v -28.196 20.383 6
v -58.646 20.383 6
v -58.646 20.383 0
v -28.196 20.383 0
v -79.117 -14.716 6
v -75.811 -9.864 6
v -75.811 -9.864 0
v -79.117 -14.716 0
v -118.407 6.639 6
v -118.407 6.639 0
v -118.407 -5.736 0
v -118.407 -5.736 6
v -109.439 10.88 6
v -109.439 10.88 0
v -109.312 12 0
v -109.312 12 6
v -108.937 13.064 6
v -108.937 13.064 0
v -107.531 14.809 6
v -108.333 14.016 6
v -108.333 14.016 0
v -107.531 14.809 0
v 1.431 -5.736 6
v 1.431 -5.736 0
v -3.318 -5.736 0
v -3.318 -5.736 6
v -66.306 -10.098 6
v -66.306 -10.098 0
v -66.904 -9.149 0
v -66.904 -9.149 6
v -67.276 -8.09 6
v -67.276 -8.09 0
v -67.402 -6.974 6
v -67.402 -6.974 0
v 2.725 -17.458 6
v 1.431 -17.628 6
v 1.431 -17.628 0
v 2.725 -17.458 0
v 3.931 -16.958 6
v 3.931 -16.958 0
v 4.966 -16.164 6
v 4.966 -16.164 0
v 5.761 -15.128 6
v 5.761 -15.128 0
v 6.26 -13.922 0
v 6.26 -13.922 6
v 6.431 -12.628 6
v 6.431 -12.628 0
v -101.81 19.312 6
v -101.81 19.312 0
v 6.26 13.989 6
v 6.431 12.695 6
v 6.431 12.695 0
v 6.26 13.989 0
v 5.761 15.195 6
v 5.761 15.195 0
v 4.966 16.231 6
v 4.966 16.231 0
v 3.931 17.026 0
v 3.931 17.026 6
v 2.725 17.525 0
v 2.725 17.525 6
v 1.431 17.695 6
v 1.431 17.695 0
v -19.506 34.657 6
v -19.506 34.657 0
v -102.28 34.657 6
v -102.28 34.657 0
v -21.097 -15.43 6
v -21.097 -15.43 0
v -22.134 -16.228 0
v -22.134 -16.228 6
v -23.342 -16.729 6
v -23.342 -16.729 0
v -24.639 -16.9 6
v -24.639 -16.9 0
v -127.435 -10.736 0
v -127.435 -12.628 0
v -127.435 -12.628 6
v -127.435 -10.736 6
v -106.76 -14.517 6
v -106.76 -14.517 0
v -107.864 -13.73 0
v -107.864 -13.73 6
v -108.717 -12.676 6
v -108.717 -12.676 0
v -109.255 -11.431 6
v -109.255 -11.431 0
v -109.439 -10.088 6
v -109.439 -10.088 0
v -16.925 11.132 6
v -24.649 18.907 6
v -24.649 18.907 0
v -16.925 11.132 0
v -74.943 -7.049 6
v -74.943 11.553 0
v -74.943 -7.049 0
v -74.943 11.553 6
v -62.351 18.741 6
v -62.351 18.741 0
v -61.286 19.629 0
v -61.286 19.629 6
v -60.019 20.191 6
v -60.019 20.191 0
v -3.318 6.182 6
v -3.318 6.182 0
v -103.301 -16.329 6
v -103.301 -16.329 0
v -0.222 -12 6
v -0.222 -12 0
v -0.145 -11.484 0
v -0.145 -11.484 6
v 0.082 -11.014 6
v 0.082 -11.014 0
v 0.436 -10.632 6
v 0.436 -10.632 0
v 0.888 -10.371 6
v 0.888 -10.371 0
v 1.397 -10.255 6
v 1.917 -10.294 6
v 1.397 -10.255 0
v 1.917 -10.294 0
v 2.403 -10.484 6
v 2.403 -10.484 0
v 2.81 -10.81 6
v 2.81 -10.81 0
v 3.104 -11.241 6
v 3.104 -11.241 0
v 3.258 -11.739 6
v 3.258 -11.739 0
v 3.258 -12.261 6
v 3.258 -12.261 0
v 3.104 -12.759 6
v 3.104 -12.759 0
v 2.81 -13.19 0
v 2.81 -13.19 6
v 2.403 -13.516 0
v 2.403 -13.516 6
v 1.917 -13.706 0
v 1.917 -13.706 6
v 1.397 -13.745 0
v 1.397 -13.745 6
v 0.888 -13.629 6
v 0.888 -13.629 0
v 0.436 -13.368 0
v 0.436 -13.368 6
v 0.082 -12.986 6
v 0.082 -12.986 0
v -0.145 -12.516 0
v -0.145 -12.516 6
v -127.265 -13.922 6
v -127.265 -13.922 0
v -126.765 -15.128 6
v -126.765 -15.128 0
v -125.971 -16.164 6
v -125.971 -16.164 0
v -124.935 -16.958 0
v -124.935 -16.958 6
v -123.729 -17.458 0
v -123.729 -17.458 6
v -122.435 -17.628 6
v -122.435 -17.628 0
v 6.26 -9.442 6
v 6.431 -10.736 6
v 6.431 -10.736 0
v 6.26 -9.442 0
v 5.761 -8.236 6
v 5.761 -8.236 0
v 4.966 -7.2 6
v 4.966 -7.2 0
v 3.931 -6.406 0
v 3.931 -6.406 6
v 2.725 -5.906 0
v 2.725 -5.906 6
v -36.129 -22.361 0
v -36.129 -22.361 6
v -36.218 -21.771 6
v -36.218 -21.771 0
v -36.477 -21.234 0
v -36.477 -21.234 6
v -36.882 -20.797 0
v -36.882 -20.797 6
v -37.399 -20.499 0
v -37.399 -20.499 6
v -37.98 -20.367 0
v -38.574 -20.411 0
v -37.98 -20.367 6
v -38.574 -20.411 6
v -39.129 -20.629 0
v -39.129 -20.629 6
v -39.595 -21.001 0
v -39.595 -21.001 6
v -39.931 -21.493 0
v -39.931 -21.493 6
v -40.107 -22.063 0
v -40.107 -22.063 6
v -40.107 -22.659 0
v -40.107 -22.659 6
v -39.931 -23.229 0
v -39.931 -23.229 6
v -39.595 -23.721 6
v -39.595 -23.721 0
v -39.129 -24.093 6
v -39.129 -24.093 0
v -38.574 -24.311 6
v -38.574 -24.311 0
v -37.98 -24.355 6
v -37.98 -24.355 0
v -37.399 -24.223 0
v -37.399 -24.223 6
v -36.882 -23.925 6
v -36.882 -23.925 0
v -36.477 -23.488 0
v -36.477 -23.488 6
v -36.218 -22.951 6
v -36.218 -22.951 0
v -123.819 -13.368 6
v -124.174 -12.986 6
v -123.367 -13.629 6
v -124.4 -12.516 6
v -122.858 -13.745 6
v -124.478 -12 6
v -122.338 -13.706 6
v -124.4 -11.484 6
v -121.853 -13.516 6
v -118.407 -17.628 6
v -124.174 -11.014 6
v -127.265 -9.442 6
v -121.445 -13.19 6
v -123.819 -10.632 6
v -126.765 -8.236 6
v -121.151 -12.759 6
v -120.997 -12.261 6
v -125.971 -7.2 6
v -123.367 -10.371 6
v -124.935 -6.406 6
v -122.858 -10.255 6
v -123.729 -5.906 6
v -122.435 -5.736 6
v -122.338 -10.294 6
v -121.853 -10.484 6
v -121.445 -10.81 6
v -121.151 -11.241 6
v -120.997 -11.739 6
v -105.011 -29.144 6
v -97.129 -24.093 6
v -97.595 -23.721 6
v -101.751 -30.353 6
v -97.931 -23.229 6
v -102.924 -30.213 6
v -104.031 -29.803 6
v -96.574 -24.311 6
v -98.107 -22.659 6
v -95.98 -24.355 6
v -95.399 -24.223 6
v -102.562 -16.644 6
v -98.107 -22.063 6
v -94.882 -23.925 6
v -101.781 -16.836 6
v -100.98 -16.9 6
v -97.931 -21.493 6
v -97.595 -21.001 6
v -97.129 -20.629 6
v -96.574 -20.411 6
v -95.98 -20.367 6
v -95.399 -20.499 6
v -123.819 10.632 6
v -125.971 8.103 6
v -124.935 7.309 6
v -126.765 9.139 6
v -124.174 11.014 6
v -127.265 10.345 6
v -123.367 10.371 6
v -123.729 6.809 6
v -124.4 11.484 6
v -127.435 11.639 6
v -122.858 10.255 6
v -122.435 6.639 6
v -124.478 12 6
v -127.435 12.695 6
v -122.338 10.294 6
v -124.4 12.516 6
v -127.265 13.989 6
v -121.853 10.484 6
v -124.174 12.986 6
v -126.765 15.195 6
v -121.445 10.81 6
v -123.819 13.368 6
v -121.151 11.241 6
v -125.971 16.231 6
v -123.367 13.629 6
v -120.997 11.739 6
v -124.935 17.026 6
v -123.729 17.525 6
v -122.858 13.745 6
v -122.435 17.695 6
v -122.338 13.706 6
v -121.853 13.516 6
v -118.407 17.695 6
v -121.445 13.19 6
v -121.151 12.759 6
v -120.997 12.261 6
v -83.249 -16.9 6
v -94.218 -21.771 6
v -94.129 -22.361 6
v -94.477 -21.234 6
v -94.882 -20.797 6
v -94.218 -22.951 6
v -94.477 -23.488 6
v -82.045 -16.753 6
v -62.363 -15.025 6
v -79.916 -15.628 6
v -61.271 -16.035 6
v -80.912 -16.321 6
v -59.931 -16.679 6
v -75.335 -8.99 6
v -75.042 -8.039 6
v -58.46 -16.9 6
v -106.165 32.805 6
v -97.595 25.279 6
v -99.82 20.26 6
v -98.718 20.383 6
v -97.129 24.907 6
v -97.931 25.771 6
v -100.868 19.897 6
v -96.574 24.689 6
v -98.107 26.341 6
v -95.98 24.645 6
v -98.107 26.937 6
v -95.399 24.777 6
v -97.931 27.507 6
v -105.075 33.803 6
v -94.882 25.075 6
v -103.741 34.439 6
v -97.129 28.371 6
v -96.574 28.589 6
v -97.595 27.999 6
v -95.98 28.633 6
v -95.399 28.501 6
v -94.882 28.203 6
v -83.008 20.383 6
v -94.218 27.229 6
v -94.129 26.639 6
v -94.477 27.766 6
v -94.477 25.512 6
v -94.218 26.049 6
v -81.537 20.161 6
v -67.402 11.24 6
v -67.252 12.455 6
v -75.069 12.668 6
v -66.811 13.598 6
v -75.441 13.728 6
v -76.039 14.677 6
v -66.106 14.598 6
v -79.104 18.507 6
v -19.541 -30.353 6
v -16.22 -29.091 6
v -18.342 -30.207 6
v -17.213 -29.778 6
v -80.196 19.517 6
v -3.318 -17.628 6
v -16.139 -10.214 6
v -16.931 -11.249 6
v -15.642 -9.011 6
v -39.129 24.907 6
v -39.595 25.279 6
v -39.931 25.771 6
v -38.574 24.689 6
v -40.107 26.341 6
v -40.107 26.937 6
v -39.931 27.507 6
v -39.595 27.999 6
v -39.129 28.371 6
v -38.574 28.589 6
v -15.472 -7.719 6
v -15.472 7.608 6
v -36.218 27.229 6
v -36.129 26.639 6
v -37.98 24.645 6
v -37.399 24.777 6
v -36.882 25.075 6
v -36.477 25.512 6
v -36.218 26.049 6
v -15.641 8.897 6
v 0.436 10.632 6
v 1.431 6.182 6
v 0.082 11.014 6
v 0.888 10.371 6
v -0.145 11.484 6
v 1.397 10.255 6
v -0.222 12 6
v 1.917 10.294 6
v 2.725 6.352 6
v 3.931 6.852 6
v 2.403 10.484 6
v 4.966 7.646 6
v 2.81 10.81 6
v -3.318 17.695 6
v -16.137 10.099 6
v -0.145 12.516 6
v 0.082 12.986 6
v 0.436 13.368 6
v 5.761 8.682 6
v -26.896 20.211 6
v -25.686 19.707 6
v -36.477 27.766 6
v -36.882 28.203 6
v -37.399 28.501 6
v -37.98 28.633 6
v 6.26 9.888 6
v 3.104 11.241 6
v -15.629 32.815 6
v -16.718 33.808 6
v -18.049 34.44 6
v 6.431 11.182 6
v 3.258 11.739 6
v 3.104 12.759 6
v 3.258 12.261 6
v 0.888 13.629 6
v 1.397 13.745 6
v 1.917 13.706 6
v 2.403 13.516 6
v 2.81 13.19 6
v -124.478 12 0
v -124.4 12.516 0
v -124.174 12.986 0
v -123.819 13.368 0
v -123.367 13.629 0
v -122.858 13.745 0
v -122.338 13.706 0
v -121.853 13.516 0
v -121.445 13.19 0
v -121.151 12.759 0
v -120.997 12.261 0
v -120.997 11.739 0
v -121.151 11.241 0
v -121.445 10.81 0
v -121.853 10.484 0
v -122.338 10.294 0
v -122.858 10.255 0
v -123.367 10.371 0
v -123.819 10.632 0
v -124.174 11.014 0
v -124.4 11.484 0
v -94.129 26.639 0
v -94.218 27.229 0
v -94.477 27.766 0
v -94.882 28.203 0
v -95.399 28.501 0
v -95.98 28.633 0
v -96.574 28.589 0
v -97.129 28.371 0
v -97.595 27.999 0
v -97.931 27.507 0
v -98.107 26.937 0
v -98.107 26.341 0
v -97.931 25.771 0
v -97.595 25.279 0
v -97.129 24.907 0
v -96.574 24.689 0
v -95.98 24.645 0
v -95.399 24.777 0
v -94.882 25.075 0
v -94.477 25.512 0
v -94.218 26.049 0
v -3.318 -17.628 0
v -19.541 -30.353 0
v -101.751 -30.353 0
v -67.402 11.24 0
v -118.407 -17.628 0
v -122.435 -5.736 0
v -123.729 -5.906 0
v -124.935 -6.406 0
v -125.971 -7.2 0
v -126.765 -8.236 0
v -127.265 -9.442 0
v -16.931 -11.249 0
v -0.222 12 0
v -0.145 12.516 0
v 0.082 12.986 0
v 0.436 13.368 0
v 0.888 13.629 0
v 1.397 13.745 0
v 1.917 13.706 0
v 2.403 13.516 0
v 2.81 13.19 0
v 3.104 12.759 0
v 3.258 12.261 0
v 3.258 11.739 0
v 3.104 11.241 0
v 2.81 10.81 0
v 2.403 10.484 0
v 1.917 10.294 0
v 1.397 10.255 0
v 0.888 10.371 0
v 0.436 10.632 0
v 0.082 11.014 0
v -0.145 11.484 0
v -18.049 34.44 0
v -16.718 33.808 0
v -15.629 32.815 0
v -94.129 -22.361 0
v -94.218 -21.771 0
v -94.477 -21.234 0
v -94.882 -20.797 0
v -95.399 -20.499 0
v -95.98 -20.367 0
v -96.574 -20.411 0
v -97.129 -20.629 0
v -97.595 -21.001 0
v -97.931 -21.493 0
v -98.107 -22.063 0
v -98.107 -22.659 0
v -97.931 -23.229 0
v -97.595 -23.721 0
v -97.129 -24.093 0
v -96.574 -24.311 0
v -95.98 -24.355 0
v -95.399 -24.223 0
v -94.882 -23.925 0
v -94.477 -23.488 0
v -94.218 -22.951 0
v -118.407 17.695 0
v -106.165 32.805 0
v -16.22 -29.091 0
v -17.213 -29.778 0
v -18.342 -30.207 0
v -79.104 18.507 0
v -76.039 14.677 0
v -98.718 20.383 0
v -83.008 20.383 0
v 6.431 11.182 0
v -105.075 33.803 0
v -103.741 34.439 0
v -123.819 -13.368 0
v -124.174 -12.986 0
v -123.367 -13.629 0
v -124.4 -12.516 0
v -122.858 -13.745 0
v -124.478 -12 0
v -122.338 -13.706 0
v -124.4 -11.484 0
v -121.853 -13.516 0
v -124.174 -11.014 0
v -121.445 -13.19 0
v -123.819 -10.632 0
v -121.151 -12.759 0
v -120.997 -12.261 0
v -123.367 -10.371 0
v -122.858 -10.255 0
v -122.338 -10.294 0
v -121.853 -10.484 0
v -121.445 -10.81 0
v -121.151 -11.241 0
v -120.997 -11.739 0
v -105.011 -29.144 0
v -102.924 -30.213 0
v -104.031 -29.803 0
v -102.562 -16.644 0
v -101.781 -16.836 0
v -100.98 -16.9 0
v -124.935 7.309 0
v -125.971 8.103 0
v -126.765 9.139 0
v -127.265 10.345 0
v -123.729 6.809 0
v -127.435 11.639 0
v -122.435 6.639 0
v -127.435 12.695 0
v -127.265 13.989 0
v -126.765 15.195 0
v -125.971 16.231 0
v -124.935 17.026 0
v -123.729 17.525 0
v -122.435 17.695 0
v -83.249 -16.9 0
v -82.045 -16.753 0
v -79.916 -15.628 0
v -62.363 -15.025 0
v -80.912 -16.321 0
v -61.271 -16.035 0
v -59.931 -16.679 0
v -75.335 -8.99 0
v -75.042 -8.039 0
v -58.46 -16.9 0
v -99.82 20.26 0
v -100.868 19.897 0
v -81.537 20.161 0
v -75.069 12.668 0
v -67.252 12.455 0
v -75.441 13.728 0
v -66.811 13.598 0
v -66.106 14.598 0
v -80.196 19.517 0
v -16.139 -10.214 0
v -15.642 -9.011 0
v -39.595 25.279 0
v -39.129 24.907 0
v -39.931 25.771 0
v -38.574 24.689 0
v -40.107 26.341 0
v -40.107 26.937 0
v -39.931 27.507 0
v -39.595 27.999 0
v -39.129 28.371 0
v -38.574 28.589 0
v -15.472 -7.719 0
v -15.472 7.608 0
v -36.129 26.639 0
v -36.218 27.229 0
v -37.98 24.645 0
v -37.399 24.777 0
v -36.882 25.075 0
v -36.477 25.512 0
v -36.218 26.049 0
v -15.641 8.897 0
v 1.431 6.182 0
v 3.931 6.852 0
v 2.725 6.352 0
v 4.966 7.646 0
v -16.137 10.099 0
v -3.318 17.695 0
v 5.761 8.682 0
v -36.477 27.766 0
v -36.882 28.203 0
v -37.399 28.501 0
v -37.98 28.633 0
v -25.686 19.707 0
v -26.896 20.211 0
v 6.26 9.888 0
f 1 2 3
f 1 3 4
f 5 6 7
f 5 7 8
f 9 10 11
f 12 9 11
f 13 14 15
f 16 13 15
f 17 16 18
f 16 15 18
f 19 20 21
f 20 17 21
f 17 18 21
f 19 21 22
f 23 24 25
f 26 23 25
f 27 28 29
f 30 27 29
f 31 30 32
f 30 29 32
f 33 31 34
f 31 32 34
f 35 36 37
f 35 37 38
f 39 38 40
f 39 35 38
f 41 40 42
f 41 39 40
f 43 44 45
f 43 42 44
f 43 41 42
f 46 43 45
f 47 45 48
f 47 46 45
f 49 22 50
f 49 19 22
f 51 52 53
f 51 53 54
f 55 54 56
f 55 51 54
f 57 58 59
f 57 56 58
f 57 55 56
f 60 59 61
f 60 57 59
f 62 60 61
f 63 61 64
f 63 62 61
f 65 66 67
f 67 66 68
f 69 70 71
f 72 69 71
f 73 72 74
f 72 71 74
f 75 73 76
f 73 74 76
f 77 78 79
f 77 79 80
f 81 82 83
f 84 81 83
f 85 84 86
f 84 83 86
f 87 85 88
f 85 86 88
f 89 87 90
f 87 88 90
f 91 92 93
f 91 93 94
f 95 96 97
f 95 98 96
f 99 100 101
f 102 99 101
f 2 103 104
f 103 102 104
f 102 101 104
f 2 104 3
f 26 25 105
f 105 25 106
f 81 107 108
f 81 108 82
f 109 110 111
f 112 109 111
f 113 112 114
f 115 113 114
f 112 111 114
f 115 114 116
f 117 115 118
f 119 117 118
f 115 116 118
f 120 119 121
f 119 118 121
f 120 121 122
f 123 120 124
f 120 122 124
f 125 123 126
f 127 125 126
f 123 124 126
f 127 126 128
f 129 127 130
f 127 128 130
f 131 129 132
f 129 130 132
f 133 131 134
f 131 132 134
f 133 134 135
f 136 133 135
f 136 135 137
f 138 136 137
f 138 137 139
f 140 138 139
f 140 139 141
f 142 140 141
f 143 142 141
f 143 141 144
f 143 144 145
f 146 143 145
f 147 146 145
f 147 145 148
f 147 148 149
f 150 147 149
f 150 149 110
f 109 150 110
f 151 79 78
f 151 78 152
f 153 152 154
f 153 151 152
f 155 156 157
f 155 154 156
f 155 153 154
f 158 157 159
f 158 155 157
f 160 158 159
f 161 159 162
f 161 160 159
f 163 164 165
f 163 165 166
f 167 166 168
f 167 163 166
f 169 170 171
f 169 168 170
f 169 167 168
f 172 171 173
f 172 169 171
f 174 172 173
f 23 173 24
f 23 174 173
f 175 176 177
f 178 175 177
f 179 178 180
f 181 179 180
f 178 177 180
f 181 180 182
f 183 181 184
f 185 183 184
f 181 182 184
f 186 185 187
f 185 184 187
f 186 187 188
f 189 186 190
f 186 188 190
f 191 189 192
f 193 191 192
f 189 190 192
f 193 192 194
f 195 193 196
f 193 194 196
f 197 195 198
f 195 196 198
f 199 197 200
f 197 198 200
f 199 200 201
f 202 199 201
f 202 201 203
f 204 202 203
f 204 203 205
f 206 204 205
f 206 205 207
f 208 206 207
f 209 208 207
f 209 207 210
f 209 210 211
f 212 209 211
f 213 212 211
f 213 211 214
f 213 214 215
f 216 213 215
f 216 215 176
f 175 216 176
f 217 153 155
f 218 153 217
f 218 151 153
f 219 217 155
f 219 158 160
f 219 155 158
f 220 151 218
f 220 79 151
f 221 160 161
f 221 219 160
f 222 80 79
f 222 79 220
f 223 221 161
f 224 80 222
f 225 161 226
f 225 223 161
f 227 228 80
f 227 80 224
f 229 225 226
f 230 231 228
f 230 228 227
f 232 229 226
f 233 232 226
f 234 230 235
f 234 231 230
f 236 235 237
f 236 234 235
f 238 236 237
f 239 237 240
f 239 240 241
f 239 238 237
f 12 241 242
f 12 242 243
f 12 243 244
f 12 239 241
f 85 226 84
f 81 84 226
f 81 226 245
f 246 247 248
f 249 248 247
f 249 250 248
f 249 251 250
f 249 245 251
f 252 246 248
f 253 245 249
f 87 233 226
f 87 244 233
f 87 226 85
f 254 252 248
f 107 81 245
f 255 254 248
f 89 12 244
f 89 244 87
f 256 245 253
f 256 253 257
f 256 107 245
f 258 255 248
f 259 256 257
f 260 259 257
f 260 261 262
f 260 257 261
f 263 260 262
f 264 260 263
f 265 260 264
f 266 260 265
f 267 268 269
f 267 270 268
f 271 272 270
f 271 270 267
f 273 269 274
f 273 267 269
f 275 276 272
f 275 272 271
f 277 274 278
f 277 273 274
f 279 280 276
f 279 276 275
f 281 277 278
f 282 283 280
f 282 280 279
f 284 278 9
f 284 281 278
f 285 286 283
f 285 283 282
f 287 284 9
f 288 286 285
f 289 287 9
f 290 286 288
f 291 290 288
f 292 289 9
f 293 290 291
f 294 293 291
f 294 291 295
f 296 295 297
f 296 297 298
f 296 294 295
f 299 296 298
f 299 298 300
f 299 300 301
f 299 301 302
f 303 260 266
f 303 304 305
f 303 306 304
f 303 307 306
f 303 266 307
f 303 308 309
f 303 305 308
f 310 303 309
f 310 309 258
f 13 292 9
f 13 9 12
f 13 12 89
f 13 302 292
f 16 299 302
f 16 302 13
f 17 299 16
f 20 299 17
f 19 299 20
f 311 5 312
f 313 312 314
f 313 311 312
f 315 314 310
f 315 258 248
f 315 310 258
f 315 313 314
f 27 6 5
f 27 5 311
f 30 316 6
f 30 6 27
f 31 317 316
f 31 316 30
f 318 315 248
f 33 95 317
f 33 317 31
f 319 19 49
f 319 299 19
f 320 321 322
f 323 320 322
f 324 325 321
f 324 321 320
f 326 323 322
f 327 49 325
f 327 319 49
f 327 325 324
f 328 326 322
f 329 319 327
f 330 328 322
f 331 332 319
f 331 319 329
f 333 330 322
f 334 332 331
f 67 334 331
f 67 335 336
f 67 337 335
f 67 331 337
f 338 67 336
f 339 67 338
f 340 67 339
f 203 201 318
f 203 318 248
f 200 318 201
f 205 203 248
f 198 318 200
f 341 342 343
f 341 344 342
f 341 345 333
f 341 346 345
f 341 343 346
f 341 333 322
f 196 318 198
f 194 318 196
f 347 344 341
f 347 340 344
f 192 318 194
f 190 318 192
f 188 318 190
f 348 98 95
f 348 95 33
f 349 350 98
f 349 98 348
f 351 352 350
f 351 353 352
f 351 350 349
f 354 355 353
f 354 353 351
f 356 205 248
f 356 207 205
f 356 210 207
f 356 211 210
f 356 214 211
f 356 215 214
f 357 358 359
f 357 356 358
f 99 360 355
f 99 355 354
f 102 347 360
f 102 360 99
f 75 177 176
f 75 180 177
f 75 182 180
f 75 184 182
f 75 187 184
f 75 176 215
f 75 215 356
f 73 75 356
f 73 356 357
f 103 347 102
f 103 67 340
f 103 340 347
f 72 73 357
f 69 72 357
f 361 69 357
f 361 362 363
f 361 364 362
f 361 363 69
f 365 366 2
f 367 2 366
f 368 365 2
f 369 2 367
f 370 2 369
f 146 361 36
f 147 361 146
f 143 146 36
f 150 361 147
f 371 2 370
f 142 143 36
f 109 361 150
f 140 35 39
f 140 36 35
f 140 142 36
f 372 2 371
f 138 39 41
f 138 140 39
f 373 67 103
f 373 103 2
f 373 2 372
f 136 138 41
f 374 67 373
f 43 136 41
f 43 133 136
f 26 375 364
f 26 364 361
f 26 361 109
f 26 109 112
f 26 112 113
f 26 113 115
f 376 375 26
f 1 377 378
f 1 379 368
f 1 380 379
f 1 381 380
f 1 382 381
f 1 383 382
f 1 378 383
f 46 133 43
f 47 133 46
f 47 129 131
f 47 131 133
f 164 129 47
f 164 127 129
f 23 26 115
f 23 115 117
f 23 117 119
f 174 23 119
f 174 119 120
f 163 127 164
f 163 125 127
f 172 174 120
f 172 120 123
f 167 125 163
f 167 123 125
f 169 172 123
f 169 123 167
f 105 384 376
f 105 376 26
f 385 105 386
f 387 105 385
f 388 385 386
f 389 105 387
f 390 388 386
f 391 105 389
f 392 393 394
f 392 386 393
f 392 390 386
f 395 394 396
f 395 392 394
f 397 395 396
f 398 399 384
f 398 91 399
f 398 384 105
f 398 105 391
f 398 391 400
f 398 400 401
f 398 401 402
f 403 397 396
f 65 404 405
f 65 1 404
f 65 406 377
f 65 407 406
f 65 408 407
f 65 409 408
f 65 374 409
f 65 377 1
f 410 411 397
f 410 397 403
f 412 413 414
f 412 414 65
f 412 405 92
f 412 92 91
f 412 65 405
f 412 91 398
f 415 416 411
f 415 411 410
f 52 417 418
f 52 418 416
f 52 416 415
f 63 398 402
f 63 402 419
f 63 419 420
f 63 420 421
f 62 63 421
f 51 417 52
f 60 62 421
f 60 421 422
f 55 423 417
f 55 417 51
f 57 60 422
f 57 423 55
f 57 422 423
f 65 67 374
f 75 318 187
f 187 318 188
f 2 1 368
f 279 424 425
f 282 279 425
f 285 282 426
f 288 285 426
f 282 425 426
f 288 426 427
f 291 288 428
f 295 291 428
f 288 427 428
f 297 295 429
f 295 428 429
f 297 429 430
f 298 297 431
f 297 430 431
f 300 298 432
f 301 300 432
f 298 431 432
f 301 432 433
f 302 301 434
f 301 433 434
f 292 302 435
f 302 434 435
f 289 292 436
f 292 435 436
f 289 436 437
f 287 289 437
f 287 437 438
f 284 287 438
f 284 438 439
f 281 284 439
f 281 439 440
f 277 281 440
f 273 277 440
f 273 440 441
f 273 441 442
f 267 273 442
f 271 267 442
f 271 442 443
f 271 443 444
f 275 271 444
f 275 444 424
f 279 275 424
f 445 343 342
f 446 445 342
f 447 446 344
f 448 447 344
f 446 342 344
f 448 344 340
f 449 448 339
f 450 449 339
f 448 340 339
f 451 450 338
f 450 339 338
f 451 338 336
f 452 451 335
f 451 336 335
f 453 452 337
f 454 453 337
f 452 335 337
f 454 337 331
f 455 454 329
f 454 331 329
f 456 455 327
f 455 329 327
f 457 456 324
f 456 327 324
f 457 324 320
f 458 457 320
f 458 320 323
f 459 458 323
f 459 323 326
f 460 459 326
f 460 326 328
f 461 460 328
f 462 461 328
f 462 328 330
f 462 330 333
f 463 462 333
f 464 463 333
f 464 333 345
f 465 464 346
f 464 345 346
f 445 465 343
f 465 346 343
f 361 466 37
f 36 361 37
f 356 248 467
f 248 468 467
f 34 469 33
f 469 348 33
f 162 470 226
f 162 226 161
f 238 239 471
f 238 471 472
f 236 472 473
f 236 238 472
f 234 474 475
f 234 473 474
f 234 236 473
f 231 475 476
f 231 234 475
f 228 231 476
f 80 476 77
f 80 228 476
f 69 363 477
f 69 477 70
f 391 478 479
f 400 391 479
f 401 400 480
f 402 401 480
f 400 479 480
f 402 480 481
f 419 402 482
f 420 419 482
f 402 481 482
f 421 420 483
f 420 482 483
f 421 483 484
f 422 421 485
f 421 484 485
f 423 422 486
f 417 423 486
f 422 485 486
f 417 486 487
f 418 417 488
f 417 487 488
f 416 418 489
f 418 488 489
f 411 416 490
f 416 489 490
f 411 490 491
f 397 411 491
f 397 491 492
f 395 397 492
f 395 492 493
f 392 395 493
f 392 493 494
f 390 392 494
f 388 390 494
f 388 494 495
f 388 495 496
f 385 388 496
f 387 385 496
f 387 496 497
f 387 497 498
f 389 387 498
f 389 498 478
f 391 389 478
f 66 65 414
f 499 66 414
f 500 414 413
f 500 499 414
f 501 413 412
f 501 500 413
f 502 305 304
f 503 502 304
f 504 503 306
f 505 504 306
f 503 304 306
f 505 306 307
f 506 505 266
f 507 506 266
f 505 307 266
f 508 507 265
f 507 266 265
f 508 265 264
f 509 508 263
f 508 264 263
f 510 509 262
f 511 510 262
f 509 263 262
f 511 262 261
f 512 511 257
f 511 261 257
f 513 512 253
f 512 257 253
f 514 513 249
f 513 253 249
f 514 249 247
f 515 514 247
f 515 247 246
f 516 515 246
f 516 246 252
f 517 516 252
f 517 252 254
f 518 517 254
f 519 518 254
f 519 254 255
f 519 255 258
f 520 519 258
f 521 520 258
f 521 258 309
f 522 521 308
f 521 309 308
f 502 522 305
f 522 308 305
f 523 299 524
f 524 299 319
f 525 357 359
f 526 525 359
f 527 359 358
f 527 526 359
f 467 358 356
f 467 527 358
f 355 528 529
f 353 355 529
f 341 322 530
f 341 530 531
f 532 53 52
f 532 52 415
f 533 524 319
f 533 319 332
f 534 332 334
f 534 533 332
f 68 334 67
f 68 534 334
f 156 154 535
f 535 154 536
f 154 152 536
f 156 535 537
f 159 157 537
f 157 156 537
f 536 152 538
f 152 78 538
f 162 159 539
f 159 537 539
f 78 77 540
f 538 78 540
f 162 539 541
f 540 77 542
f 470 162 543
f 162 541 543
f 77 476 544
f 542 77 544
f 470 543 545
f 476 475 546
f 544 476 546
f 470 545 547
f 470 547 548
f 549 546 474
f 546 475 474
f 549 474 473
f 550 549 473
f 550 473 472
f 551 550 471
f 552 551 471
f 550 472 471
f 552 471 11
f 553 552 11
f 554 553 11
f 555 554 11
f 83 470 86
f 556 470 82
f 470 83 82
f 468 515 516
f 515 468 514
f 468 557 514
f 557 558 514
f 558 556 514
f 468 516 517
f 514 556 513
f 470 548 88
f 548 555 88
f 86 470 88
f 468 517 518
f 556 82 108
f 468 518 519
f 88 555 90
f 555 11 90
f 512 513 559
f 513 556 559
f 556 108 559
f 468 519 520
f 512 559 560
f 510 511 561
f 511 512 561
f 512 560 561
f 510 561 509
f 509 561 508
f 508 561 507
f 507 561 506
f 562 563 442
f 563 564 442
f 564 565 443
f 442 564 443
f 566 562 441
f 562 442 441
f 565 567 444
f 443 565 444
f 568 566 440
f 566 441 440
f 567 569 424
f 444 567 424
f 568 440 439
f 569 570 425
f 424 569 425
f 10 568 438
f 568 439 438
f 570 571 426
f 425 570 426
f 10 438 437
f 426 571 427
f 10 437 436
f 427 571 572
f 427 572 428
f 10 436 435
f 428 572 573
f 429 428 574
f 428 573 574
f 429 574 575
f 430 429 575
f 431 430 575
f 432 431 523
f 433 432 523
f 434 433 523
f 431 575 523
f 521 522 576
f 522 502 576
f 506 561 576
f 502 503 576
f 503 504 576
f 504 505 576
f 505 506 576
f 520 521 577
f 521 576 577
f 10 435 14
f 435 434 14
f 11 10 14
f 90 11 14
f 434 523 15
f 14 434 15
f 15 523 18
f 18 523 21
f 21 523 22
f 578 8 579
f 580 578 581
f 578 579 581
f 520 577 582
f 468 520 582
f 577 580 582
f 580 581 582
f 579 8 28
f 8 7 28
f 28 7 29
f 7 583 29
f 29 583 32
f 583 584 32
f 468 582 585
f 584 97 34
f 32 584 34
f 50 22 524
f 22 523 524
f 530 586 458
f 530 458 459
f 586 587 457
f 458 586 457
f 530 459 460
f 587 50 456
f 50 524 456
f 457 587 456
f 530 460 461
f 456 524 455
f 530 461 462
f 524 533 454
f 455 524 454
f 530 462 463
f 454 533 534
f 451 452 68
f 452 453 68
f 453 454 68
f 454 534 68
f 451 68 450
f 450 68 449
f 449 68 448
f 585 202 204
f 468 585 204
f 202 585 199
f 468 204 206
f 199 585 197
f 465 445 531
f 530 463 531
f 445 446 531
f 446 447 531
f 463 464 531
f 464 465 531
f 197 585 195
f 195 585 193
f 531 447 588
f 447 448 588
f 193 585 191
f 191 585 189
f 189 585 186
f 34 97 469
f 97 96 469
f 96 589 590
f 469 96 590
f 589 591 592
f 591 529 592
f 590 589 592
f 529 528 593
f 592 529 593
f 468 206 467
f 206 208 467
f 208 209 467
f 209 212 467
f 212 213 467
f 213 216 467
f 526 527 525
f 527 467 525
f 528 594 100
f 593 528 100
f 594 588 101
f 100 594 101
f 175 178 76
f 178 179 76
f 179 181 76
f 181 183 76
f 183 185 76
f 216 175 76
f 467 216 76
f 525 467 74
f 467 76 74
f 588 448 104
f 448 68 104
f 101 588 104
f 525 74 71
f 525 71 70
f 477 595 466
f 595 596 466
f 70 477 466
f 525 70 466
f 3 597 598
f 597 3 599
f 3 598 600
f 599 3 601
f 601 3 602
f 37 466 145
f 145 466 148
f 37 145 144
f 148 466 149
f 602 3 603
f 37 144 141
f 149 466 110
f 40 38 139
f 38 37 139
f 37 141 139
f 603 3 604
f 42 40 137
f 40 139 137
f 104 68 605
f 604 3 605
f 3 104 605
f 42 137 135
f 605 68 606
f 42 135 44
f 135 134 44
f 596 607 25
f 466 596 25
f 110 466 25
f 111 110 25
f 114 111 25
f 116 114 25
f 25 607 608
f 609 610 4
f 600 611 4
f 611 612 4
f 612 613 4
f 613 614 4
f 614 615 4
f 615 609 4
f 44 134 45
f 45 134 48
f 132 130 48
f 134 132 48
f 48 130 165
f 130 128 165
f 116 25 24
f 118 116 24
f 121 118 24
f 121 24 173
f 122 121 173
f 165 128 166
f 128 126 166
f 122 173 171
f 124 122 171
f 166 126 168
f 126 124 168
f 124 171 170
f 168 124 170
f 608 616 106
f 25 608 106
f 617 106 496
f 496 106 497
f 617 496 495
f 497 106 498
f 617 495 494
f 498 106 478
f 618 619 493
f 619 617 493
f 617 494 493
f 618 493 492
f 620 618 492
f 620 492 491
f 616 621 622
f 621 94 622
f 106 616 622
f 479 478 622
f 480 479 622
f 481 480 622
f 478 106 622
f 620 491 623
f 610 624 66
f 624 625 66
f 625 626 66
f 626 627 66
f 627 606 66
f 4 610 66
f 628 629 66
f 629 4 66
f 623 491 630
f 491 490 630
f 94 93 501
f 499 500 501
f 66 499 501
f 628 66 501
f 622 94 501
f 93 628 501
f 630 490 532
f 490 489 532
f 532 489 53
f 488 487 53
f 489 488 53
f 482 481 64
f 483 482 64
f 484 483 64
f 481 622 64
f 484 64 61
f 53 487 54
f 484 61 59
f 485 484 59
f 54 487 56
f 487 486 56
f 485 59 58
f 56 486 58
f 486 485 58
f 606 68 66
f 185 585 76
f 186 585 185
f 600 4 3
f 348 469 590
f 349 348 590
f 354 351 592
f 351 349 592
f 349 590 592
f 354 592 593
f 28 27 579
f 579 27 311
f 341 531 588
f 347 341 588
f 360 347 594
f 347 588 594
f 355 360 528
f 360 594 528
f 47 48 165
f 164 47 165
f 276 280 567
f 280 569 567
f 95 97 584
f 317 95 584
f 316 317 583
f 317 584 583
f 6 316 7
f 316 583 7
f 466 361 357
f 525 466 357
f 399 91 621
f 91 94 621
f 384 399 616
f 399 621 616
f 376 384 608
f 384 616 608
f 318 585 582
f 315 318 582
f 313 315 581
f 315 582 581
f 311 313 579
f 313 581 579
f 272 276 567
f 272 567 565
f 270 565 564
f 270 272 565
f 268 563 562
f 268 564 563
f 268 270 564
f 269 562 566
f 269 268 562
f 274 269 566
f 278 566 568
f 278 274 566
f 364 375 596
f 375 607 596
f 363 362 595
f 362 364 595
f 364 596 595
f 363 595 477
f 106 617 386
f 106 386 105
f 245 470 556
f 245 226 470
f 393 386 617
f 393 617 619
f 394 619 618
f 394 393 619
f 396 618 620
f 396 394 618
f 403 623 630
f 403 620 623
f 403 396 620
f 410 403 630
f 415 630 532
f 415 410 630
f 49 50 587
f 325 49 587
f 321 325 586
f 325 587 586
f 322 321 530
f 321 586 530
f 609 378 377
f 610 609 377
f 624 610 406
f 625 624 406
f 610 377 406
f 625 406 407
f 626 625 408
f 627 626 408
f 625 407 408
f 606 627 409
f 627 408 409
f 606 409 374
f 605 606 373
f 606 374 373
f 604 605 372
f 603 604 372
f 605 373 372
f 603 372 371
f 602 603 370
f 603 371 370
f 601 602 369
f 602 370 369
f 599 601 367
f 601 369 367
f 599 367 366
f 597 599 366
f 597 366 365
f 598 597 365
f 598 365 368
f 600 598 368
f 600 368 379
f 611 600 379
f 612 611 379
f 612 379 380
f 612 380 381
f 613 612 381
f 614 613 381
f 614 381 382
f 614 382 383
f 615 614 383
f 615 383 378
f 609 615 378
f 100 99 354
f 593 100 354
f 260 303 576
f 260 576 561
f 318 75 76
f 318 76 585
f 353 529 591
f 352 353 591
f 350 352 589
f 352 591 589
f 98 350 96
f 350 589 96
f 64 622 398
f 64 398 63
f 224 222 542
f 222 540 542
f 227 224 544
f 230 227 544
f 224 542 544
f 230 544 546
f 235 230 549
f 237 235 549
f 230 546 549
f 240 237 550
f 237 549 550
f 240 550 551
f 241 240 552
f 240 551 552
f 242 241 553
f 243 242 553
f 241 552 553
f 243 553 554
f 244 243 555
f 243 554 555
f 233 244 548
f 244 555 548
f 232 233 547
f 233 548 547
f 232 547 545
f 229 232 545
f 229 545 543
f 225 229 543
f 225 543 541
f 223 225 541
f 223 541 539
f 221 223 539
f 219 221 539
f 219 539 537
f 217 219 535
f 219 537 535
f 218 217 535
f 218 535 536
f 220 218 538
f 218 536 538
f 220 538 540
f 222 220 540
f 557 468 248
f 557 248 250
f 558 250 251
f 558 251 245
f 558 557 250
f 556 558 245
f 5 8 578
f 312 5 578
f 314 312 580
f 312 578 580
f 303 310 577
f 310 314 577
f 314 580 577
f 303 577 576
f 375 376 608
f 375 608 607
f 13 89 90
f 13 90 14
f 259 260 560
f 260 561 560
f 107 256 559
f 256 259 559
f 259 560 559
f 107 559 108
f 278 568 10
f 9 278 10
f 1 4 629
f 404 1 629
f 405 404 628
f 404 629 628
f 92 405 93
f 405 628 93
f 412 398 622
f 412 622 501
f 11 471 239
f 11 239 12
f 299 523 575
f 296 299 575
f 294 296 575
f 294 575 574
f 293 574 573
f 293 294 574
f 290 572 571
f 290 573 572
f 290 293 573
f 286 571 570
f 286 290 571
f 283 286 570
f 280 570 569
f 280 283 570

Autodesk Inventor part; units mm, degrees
ref_plane "YZ Plane" through (0, 0, 0) normal (1, 0, 0) x (0, 1, 0)
ref_plane "XZ Plane" through (0, 0, 0) normal (0, 1, 0) x (-1, 0, 0)
ref_plane "XY Plane" through (0, 0, 0) normal (0, 0, 1) x (1, 0, 0)
sketch "Sketch1" plane through (0, 0, 0) normal (0, 0, 1) x (1, 0, 0)
  line L0 (-3.3178, 34.6574) -> (-118.4066, 34.6574)
  line L1 (-118.4066, 34.6574) -> (-118.4066, -30.3526)
  line L2 (-118.4066, -30.3526) -> (-3.3178, -30.3526)
  line L3 (-3.3178, -30.3526) -> (-3.3178, 34.6574)
  line L4 (-118.4066, 17.6954) -> (-127.435, 17.6954)
  line L5 (-127.435, 17.6954) -> (-127.435, 6.6388)
  line L6 (-127.435, 6.6388) -> (-118.4066, 6.6388)
  line L7 (-118.4066, 6.6388) -> (-118.4066, 17.6954)
  line L8 (-118.4066, -17.6281) -> (-127.435, -17.6281)
  line L9 (-127.435, -17.6281) -> (-127.435, -5.7358)
  line L10 (-127.435, -5.7358) -> (-118.4066, -5.7358)
  line L11 (-118.4066, -5.7358) -> (-118.4066, -17.6281)
  line L12 (-3.3178, -17.6281) -> (6.4307, -17.6281)
  line L13 (6.4307, -17.6281) -> (6.4307, -5.7358)
  line L14 (6.4307, -5.7358) -> (-3.3178, -5.7358)
  line L15 (-3.3178, -5.7358) -> (-3.3178, -17.6281)
  line L16 (-3.3178, 17.6954) -> (6.4307, 17.6954)
  line L17 (6.4307, 17.6954) -> (6.4307, 6.1817)
  line L18 (6.4307, 6.1817) -> (-3.3178, 6.1817)
  line L19 (-3.3178, 6.1817) -> (-3.3178, 17.6954)
  point P0 (0, 0)
  point P1 (-3.3178, -5.7358)
  point P2 (-3.3178, 6.1817)
extrude "Extrusion1" add sketch "Sketch1" along normal blind 6
sketch "Sketch2" plane through (0, 0, 6) normal (0, 0, 1) x (1, 0, 0)
  circle A0 centre (-38.1293, 26.639) radius 1.5 projected
  circle A1 centre (-38.1293, -22.361) radius 1.5 projected
  circle A2 centre (-96.1293, -22.361) radius 1.5 projected
  circle A3 centre (-96.1293, 26.639) radius 1.5 projected
  line L0 (6.4307, 17.6954) -> (-3.3178, 17.6954) projected
  line L1 (-3.3178, 17.6954) -> (-3.3178, 34.6574) projected
  line L2 (-3.3178, 34.6574) -> (-118.4066, 34.6574) projected
  line L3 (-118.4066, 34.6574) -> (-118.4066, 17.6954) projected
  line L4 (-118.4066, 17.6954) -> (-127.435, 17.6954) projected
  line L5 (-127.435, 17.6954) -> (-127.435, 6.6388) projected
  line L6 (-127.435, 6.6388) -> (-118.4066, 6.6388) projected
  line L7 (-118.4066, 6.6388) -> (-118.4066, -5.7358) projected
  line L8 (-118.4066, -5.7358) -> (-127.435, -5.7358) projected
  line L9 (-127.435, -5.7358) -> (-127.435, -17.6281) projected
  line L10 (-127.435, -17.6281) -> (-118.4066, -17.6281) projected
  line L11 (-118.4066, -17.6281) -> (-118.4066, -30.3526) projected
  line L12 (-118.4066, -30.3526) -> (-3.3178, -30.3526) projected
  line L13 (-3.3178, -30.3526) -> (-3.3178, -17.6281) projected
  line L14 (-3.3178, -17.6281) -> (6.4307, -17.6281) projected
  line L15 (6.4307, -17.6281) -> (6.4307, -5.7358) projected
  line L16 (6.4307, -5.7358) -> (-3.3178, -5.7358) projected
  line L17 (-3.3178, -5.7358) -> (-3.3178, 6.1817) projected
  line L18 (-3.3178, 6.1817) -> (6.4307, 6.1817) projected
  line L19 (6.4307, 6.1817) -> (6.4307, 17.6954) projected
  circle A4 centre (-96.1293, 26.639) radius 2
  circle A5 centre (-96.1293, -22.361) radius 2
  circle A6 centre (-38.1293, -22.361) radius 2
  circle A7 centre (-38.1293, 26.639) radius 2
  point P0 (0, 0)
  dimension "d9" = 4
  dimension "d10" = 4
  dimension "d11" = 4
  dimension "d12" = 4
extrude "Extrusion2" cut sketch "Sketch2" against normal blind 6 contours A0 | A1 | A2 | A3 | A4 | A5 | A6 | A7
sketch "Sketch3" plane through (0, 0, 0) normal (0, 0, -1) x (-1, 0, 0)
  circle A0 centre (-1.5276, 12) radius 1.75 projected
  line L0 (-6.4307, 17.6954) -> (3.3178, 17.6954) projected
  line L1 (-6.4307, 6.1817) -> (-6.4307, 17.6954) projected
  line L2 (3.3178, 6.1817) -> (-6.4307, 6.1817) projected
  line L3 (3.3178, -5.7358) -> (3.3178, 6.1817) projected
  line L4 (-6.4307, -5.7358) -> (3.3178, -5.7358) projected
  line L5 (-6.4307, -17.6281) -> (-6.4307, -5.7358) projected
  line L6 (3.3178, -17.6281) -> (-6.4307, -17.6281) projected
  line L7 (3.3178, -30.3526) -> (3.3178, -17.6281) projected
  line L8 (118.4066, -30.3526) -> (3.3178, -30.3526) projected
  line L9 (118.4066, -17.6281) -> (118.4066, -30.3526) projected
  line L10 (127.435, -17.6281) -> (118.4066, -17.6281) projected
  line L11 (127.435, -5.7358) -> (127.435, -17.6281) projected
  line L12 (118.4066, -5.7358) -> (127.435, -5.7358) projected
  line L13 (118.4066, 6.6388) -> (118.4066, -5.7358) projected
  line L14 (127.435, 6.6388) -> (118.4066, 6.6388) projected
  line L15 (127.435, 17.6954) -> (127.435, 6.6388) projected
  line L16 (118.4066, 17.6954) -> (127.435, 17.6954) projected
  line L17 (118.4066, 34.6574) -> (118.4066, 17.6954) projected
  line L18 (3.3178, 34.6574) -> (118.4066, 34.6574) projected
  line L19 (3.3178, 17.6954) -> (3.3178, 34.6574) projected
  circle A1 centre (-1.5276, -12) radius 1.75 projected
  circle A2 centre (122.7276, -12) radius 1.75 projected
  circle A3 centre (122.7276, 12) radius 1.75 projected
  point P0 (0, 0)
extrude "Extrusion3" cut sketch "Sketch3" against normal blind 6 contours A0 | A1 | A2 | A3
sketch "Sketch4" plane through (0, 0, 6) normal (0, 0, 1) x (1, 0, 0)
  circle A0 centre (-38.1293, -22.361) radius 1.5 projected
  circle A1 centre (-96.1293, -22.361) radius 1.5 projected
  circle A2 centre (-38.1293, 26.639) radius 1.5 projected
  circle A3 centre (-96.1293, 26.639) radius 1.5 projected
  arc A4 (-108.1293, -22.361) -> (-100.1293, -30.361) centre (-100.1293, -22.361) ccw projected
  line L0 (-108.1293, 26.639) -> (-108.1293, -22.361) projected
  arc A5 (-100.1293, 34.639) -> (-108.1293, 26.639) centre (-100.1293, 26.639) ccw projected
  line L1 (-21.1293, 34.639) -> (-100.1293, 34.639) projected
  arc A6 (-13.1293, 26.639) -> (-21.1293, 34.639) centre (-21.1293, 26.639) ccw projected
  line L2 (-13.1293, -22.361) -> (-13.1293, 26.639) projected
  arc A7 (-21.1293, -30.361) -> (-13.1293, -22.361) centre (-21.1293, -22.361) ccw projected
  line L3 (-100.1293, -30.361) -> (-21.1293, -30.361) projected
  line L4 (-127.435, -17.6281) -> (-118.4066, -17.6281) projected
  line L5 (-118.4066, -30.3526) -> (-3.3178, -30.3526) projected
  line L6 (-118.4066, 34.6574) -> (-118.4066, 17.6954) projected
  line L7 (-118.4066, 17.6954) -> (-104.664, 34.6574)
  line L8 (-3.3178, 34.6574) -> (-118.4066, 34.6574) projected
  line L9 (-3.3178, 17.6954) -> (-3.3178, 34.6574) projected
  line L10 (-3.3178, 17.6954) -> (-17.3486, 34.9264)
  line L11 (-3.3178, -17.6281) -> (6.4307, -17.6281) projected
  line L12 (-109.439, 13.3074) -> (-100.4496, 20.3827)
  line L13 (-100.4496, 20.3827) -> (-26.1151, 20.3827)
  line L14 (-26.1151, 20.3827) -> (-15.4724, 9.6699)
  line L15 (-15.4724, 9.6699) -> (-15.4724, -9.7854)
  line L16 (-15.4724, -9.7854) -> (-22.5627, -16.9004)
  line L17 (-22.5627, -16.9004) -> (-102.211, -16.9004)
  line L18 (-102.211, -16.9004) -> (-109.439, -13.1126)
  line L19 (-109.439, -13.1126) -> (-109.439, 13.3074)
  line L20 (-80.6051, 20.3827) -> (-74.943, 13.3074)
  line L21 (-74.943, 13.3074) -> (-74.943, -8.5904)
  line L22 (-74.943, -8.5904) -> (-80.6051, -16.9004)
  line L23 (-60.8622, 20.3827) -> (-67.4019, 13.1693)
  line L24 (-67.4019, 13.1693) -> (-67.4019, -8.7285)
  line L25 (-67.4019, -8.7285) -> (-60.8622, -16.9004)
  line L26 (-3.3178, -30.3526) -> (-3.3178, -17.6281) projected
  line L27 (-3.3178, -17.6281) -> (-17.6408, -30.3526)
  line L28 (-118.4066, -30.3526) -> (-3.3178, -30.3526) projected
  line L29 (-118.4066, -17.6281) -> (-103.6048, -30.3526)
  line L30 (-118.4066, -17.6281) -> (-118.4066, -30.3526) projected
  line L31 (-118.4066, -17.6281) -> (-118.4066, -30.3526)
  line L32 (-118.4066, -30.3526) -> (-103.6048, -30.3526)
  line L33 (-3.3178, -17.6281) -> (-3.3178, -30.3526)
  line L34 (-17.6408, -30.3526) -> (-3.3178, -30.3526)
  point P0 (0, 0)
  point P1 (-17.1296, 34.6574)
  point P2 (-17.6408, -30.3526)
extrude "Extrusion4" cut sketch "Sketch4" against normal blind 6 contours L27 L26 L5 | L5 L30 L29 | L18 L19 L12 L0 | L0 L12 L13 L20 L21 L22 L17 L18 | L25 L24 L23 L13 L14 L15 L16 L17 | L8 L7 L6 | L8 L9 L10
fillet "Fillet1" radius 5 28 edges at (-127.435, 17.6954, 3) (-127.435, 6.6388, 3) (-127.435, -5.7358, 3) (-127.435, -17.6281, 3) (-104.664, 34.6574, 3) (-17.1296, 34.6574, 3) (6.4307, 17.6954, 3) (6.4307, 6.1817, 3) (6.4307, -5.7358, 3) (6.4307, -17.6281, 3) (-17.6408, -30.3526, 3) (-103.6048, -30.3526, 3) (-80.6051, 20.3827, 3) (-74.943, 13.3074, 3) (-26.1151, 20.3827, 3) (-15.4724, 9.6699, 3) (-15.4724, -9.7854, 3) (-22.5627, -16.9004, 3) (-60.8622, 20.3827, 3) (-67.4019, 13.1693, 3) (-67.4019, -8.7285, 3) (-60.8622, -16.9004, 3) (-109.439, -13.1126, 3) (-102.211, -16.9004, 3) (-100.4496, 20.3827, 3) (-109.439, 13.3074, 3) (-74.943, -8.5904, 3) (-80.6051, -16.9004, 3)
properties part number "Pi_holder"
